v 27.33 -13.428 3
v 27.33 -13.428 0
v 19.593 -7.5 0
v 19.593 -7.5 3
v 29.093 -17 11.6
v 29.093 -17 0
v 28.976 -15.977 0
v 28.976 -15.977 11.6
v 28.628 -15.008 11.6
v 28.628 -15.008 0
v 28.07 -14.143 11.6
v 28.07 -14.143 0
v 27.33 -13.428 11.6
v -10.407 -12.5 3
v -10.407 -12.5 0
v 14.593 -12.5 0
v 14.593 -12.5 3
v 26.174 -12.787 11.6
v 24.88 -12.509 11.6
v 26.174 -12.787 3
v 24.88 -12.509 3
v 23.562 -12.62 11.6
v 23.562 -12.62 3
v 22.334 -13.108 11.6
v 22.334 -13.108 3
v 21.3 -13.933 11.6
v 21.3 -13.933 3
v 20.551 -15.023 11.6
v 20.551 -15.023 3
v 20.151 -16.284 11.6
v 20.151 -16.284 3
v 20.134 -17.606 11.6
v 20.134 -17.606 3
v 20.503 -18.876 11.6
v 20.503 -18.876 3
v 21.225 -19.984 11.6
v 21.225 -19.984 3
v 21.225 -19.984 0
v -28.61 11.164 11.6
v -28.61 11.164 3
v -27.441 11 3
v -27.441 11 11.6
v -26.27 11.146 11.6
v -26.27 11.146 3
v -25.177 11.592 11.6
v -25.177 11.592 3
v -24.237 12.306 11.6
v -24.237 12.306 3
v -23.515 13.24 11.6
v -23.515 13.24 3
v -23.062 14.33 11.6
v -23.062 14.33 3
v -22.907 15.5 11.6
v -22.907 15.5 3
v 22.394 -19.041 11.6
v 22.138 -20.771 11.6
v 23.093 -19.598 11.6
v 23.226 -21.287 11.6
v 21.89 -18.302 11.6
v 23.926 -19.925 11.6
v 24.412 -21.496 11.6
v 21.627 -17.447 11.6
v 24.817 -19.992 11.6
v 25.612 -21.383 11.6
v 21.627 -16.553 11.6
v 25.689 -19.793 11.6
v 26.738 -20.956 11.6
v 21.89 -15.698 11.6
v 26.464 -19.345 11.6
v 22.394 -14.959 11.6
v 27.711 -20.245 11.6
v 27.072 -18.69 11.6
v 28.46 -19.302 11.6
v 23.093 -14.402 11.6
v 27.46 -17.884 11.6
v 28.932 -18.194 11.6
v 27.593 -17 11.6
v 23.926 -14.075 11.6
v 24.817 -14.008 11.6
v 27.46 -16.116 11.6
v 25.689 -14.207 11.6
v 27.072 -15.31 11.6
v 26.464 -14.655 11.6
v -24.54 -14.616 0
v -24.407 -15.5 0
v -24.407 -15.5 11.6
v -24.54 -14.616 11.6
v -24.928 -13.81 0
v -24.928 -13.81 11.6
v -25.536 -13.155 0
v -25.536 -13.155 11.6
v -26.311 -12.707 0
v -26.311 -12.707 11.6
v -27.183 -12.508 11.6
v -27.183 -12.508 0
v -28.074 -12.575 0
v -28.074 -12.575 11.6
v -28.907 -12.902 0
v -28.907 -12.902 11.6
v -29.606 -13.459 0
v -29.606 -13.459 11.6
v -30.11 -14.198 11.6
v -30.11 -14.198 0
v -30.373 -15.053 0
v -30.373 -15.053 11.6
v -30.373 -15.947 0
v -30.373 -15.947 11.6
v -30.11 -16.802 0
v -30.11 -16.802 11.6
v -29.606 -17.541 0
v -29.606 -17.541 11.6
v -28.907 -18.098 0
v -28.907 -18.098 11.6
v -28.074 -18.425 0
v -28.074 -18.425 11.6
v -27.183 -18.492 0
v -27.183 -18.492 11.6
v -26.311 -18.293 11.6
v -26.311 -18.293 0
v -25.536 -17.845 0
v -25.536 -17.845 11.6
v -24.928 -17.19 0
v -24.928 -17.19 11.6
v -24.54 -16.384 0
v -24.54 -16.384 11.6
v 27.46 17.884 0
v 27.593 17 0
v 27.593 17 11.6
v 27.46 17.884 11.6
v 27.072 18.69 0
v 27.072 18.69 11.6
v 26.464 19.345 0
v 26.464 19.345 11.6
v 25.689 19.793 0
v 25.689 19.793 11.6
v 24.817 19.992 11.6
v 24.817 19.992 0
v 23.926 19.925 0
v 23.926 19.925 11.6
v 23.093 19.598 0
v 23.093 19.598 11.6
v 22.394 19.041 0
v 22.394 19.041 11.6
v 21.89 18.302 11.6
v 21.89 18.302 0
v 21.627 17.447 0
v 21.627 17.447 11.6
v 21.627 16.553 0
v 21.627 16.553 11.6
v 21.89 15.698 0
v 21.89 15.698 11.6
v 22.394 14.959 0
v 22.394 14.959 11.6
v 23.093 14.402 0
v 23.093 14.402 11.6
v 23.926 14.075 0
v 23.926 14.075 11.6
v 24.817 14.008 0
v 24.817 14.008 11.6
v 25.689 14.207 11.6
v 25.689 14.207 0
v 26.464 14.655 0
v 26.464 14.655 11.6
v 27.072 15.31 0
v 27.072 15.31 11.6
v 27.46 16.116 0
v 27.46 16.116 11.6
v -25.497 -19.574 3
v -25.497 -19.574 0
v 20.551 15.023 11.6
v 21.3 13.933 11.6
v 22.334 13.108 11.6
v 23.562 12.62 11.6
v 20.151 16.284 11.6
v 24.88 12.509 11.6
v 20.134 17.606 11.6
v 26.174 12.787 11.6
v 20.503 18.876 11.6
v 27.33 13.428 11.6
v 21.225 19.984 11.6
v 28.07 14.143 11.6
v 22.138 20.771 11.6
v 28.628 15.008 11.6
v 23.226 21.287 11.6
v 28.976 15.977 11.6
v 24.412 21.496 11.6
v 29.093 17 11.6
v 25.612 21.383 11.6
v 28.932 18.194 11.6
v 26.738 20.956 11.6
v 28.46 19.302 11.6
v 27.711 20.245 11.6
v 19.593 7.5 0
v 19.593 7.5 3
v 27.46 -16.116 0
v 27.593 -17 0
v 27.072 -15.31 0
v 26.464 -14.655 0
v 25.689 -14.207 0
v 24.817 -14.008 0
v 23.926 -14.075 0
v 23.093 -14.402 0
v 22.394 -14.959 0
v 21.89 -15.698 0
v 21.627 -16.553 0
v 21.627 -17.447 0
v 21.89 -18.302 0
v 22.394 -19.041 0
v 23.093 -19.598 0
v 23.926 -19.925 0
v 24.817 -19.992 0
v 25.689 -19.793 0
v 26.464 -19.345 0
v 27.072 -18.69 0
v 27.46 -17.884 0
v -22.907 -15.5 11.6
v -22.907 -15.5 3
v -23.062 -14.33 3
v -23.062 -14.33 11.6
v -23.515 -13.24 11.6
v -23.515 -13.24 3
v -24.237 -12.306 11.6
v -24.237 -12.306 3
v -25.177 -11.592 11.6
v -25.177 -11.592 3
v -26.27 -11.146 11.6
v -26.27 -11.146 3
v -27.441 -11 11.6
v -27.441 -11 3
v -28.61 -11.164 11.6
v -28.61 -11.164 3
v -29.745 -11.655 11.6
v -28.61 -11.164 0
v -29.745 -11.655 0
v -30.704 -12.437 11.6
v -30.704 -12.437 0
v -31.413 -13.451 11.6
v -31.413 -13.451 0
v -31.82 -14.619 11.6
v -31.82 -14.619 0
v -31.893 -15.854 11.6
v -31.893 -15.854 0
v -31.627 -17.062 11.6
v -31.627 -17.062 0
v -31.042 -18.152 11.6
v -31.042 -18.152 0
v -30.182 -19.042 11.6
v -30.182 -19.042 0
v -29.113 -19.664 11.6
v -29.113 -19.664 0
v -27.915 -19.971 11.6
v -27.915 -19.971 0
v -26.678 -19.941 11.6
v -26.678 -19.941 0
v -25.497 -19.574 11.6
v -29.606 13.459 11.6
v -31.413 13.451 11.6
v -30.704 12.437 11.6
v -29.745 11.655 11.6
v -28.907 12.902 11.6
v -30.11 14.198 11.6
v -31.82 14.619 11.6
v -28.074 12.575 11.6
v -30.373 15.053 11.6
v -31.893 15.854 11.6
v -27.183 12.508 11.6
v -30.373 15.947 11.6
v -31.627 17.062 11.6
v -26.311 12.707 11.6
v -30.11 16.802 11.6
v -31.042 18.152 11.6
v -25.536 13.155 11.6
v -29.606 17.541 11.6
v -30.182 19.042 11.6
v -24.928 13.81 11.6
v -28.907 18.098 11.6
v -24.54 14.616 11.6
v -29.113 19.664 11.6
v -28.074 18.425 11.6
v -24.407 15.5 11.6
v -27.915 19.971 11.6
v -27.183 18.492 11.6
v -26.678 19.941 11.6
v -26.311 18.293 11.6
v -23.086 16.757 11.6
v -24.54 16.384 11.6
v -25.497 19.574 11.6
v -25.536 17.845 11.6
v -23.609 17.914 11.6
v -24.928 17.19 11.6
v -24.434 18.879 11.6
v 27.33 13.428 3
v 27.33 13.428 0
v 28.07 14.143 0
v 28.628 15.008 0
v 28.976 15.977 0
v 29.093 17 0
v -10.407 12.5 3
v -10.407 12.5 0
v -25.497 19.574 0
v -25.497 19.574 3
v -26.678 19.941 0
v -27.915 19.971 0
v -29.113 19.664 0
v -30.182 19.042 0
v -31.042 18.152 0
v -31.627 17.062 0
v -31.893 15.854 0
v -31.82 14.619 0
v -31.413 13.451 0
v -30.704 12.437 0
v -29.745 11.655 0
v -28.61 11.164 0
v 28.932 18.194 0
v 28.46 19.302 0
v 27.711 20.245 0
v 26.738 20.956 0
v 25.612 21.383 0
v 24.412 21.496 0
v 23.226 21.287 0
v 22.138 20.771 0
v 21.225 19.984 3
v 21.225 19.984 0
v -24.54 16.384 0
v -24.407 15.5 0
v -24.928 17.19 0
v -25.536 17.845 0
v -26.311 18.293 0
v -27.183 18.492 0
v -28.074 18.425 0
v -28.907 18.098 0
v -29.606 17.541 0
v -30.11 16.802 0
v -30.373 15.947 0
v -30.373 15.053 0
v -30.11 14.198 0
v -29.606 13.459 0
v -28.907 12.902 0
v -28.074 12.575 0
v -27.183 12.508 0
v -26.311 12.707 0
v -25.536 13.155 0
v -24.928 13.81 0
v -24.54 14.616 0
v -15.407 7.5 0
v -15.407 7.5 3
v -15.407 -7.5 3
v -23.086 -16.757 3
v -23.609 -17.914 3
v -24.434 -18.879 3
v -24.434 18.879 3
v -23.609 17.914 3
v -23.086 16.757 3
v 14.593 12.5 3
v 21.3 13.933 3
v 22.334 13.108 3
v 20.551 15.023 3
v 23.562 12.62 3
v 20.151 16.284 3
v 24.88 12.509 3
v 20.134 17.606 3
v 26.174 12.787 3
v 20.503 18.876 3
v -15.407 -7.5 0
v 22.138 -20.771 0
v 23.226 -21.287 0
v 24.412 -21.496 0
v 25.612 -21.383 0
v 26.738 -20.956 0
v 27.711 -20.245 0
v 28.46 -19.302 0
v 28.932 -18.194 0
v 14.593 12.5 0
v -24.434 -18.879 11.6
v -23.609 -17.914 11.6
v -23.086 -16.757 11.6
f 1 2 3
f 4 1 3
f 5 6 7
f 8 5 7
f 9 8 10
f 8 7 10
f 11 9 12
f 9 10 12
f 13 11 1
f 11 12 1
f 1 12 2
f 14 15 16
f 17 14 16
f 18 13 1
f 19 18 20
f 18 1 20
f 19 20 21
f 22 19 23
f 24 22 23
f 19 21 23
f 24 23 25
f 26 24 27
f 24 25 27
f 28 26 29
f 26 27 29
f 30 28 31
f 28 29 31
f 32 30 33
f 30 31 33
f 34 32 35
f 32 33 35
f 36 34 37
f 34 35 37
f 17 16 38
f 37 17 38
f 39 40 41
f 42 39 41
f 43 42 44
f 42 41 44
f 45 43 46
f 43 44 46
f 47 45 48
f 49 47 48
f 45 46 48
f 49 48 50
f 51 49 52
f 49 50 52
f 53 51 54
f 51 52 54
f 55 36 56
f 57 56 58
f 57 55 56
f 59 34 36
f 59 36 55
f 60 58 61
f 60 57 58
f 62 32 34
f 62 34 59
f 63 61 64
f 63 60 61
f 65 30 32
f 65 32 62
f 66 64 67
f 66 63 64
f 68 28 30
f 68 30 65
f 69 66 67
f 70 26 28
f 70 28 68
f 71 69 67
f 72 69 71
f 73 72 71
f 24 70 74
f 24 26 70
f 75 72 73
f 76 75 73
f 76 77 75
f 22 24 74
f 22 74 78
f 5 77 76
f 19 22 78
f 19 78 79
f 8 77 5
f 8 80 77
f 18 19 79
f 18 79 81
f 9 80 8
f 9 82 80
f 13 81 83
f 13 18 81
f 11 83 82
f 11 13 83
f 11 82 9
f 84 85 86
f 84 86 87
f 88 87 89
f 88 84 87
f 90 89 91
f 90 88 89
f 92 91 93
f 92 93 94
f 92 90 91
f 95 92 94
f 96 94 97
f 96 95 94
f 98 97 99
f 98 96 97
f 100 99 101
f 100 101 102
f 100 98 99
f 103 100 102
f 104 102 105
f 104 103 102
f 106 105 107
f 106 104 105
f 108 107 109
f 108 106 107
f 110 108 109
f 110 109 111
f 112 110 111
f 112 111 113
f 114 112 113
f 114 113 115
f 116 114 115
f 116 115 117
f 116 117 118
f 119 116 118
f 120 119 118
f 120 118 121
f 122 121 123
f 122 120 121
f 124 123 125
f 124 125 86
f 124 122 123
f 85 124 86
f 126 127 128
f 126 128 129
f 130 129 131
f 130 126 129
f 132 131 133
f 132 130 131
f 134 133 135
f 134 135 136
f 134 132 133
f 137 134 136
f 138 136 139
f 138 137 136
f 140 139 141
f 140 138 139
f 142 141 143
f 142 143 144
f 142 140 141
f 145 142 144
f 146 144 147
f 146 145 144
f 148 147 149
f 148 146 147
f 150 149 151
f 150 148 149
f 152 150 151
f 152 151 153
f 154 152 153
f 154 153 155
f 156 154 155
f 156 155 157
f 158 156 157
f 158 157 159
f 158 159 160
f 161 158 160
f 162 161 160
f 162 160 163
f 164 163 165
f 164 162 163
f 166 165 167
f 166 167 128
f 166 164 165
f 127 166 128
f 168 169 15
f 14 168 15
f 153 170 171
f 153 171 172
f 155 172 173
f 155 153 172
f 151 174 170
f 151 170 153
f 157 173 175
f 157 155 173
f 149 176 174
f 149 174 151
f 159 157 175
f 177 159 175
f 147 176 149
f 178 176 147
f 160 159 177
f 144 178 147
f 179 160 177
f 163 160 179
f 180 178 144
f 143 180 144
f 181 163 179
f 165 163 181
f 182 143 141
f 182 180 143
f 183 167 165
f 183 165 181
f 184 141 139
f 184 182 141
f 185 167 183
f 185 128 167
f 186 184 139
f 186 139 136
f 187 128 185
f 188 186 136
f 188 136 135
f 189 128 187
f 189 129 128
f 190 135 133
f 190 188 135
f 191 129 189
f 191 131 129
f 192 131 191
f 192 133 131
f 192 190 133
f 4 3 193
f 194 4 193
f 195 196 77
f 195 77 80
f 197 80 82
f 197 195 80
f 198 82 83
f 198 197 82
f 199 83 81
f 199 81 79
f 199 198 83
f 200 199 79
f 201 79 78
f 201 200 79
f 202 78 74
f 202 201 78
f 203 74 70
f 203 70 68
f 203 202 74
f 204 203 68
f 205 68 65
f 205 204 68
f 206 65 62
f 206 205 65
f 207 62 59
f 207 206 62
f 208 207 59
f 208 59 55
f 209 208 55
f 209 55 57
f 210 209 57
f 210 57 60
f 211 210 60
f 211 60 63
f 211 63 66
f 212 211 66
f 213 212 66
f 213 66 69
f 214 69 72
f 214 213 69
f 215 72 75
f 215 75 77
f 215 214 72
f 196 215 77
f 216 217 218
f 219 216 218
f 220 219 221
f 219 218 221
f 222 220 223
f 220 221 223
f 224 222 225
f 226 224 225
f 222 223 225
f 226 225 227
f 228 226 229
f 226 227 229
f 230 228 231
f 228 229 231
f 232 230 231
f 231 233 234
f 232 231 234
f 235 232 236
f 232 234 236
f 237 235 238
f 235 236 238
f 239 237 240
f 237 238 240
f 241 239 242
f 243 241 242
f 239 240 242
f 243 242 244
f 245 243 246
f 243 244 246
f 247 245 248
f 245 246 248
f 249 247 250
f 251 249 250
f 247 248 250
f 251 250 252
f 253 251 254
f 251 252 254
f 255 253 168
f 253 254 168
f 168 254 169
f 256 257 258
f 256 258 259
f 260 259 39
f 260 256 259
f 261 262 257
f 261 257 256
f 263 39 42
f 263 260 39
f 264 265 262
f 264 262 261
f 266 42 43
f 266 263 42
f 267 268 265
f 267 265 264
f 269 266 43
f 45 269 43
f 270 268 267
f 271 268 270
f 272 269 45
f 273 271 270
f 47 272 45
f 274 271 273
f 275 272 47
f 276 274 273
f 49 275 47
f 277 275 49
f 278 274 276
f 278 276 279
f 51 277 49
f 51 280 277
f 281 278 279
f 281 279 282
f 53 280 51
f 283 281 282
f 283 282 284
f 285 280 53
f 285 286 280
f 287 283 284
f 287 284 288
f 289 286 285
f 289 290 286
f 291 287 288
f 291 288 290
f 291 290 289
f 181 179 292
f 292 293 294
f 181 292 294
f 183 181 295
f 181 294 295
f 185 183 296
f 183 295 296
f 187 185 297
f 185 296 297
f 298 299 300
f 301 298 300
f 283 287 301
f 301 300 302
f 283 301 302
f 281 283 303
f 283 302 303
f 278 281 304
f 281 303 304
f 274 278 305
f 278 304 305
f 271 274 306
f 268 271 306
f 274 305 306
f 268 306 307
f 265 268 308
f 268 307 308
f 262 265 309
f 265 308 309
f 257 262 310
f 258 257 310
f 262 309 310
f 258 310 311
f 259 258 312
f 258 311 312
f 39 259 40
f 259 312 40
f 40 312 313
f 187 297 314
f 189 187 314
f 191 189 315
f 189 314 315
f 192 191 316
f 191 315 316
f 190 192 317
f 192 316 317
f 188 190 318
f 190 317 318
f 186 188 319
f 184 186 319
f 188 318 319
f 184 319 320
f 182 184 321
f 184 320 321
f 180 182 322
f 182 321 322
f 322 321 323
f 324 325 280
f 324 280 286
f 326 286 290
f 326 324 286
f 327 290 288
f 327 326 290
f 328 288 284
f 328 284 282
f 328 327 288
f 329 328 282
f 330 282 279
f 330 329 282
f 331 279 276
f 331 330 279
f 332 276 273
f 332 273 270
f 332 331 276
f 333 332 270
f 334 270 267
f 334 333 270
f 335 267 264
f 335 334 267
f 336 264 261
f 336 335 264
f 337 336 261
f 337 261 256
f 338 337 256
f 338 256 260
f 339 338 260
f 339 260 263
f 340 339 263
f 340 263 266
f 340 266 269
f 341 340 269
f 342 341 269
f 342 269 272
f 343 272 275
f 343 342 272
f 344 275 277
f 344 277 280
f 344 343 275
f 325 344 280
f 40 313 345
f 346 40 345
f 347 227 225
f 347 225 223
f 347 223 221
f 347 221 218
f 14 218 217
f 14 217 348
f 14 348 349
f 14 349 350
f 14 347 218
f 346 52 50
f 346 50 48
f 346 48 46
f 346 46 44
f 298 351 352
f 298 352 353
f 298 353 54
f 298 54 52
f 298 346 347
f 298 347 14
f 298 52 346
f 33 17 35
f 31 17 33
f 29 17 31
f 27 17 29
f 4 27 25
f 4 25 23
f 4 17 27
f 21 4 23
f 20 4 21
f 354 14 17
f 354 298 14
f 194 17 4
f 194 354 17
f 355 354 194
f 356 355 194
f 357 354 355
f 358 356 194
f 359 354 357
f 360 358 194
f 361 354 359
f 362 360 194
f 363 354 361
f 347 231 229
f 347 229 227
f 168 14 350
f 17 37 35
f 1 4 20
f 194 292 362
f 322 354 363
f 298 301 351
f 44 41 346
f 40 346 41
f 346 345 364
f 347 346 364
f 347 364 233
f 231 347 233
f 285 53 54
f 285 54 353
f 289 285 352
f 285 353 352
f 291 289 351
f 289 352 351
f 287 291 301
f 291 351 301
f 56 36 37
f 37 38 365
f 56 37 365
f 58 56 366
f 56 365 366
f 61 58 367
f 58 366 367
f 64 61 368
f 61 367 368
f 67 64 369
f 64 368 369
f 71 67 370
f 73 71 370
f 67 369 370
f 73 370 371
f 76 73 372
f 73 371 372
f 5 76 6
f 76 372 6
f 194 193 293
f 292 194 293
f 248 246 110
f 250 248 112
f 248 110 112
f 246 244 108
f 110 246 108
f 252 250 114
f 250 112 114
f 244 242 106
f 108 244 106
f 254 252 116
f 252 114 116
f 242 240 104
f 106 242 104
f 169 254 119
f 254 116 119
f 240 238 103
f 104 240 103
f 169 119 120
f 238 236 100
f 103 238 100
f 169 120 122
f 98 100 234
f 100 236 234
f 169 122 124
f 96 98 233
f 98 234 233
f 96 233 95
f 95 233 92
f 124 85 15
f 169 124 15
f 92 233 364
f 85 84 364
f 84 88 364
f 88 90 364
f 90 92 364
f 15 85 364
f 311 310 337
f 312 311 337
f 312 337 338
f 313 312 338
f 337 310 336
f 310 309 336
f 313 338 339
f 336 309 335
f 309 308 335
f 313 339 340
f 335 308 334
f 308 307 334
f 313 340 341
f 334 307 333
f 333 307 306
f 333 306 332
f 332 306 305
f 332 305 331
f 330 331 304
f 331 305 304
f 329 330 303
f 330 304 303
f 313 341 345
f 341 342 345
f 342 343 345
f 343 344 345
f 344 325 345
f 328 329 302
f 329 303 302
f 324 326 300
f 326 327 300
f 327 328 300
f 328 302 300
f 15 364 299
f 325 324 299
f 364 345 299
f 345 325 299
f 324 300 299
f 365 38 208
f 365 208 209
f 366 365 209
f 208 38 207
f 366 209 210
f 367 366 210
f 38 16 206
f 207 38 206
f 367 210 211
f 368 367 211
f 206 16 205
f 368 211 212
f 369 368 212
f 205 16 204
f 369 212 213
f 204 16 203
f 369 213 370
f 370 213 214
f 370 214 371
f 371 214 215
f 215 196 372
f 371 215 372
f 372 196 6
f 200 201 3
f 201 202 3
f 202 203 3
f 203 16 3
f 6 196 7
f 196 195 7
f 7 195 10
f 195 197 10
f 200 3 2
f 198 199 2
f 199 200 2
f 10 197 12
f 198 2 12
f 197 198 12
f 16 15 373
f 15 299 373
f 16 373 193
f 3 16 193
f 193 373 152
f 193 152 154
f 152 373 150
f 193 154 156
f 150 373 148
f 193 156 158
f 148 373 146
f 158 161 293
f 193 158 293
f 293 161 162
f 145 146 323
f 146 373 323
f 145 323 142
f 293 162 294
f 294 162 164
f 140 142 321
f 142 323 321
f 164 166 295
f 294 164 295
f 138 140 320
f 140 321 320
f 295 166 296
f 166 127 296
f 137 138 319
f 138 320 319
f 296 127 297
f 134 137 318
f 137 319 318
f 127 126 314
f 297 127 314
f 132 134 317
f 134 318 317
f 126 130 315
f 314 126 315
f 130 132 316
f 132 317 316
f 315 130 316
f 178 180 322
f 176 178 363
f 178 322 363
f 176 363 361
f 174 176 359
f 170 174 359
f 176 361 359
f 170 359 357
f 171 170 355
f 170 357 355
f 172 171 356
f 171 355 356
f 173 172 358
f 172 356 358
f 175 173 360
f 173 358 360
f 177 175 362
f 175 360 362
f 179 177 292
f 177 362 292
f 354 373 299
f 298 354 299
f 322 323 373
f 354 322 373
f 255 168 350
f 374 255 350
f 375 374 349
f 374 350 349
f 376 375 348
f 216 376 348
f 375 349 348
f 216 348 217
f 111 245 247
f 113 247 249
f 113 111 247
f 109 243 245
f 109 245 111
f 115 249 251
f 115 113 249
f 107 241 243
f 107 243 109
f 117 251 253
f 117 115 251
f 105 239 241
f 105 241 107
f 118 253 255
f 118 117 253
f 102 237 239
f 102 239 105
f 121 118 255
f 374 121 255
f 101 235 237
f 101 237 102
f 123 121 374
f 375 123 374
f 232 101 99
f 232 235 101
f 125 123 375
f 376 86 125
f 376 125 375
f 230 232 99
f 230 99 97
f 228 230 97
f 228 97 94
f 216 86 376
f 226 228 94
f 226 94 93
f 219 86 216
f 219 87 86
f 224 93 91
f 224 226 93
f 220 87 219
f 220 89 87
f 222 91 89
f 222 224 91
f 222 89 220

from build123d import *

# Parameters (mm, degrees)
F1_DEPTH = 3
F0_R     = 3
F2_DEPTH = 11.6


with BuildPart() as f1:
    # F0 (on Top) → F1 (new body)
    with BuildSketch(Plane.XY):
        with BuildLine():
            Line((-15.406721, -12.5), (-15.406721, -7.5))
            Line((-15.406721, -7.5), (-28.609985, -11.163855))
            ThreePointArc((-28.609985, -11.163855), (-24.683184, -11.917774), (-22.906721, -15.5))
            ThreePointArc((-22.906721, -15.5), (-23.608966, -17.91393), (-25.496524, -19.57445))
            Line((-25.496524, -19.57445), (-10.406721, -12.5))
            Line((-10.406721, -12.5), (-15.406721, -12.5))
        make_face()
        Polygon((14.593279, 12.5), (-10.406721, 12.5), (-15.406721, 12.5), (-15.406721, 7.5), (-15.406721, -7.5), (-15.406721, -12.5), (-10.406721, -12.5), (14.593279, -12.5), (19.593279, -12.5), (19.593279, -7.5), (19.593279, 7.5), (19.593279, 12.5), align=None)
        with BuildLine():
            ThreePointArc((-25.496524, 19.57445), (-23.608966, 17.91393), (-22.906721, 15.5))
            ThreePointArc((-22.906721, 15.5), (-24.683184, 11.917774), (-28.609985, 11.163855))
            Line((-28.609985, 11.163855), (-15.406721, 7.5))
            Line((-15.406721, 7.5), (-15.406721, 12.5))
            Line((-15.406721, 12.5), (-10.406721, 12.5))
            Line((-10.406721, 12.5), (-25.496524, 19.57445))
        make_face()
        with BuildLine():
            Line((27.330159, -13.427958), (19.593279, -7.5))
            Line((19.593279, -7.5), (19.593279, -12.5))
            Line((19.593279, -12.5), (14.593279, -12.5))
            Line((14.593279, -12.5), (21.225295, -19.984407))
            ThreePointArc((21.225295, -19.984407), (21.299902, -13.93346), (27.330159, -13.427958))
        make_face()
        with BuildLine():
            Line((21.225295, 19.984407), (14.593279, 12.5))
            Line((14.593279, 12.5), (19.593279, 12.5))
            Line((19.593279, 12.5), (19.593279, 7.5))
            Line((19.593279, 7.5), (27.330159, 13.427958))
            ThreePointArc((27.330159, 13.427958), (21.299902, 13.93346), (21.225295, 19.984407))
        make_face()
    extrude(amount=F1_DEPTH)

    # F0 (on Top) → F2 (join)
    with BuildSketch(Plane.XY):
        with BuildLine():
            ThreePointArc((-22.906721, -15.5), (-24.683184, -11.917774), (-28.609985, -11.163855))
            ThreePointArc((-28.609985, -11.163855), (-31.626848, -17.06222), (-25.496524, -19.57445))
            ThreePointArc((-25.496524, -19.57445), (-23.608966, -17.91393), (-22.906721, -15.5))
        make_face()
        with Locations((-27.406721, -15.5)):
            Circle(F0_R, mode=Mode.SUBTRACT)
        with BuildLine():
            ThreePointArc((29.093279, -17), (28.628496, -15.008262), (27.330159, -13.427958))
            ThreePointArc((27.330159, -13.427958), (21.299902, -13.93346), (21.225295, -19.984407))
            ThreePointArc((21.225295, -19.984407), (26.189223, -21.207489), (29.093279, -17))
        make_face()
        with Locations((24.593279, -17)):
            Circle(F0_R, mode=Mode.SUBTRACT)
        with BuildLine():
            ThreePointArc((29.093279, 17), (26.189223, 21.207489), (21.225295, 19.984407))
            ThreePointArc((21.225295, 19.984407), (21.299902, 13.93346), (27.330159, 13.427958))
            ThreePointArc((27.330159, 13.427958), (28.628496, 15.008262), (29.093279, 17))
        make_face()
        with Locations((24.593279, 17)):
            Circle(F0_R, mode=Mode.SUBTRACT)
        with BuildLine():
            ThreePointArc((-28.609985, 11.163855), (-24.683184, 11.917774), (-22.906721, 15.5))
            ThreePointArc((-22.906721, 15.5), (-23.608966, 17.91393), (-25.496524, 19.57445))
            ThreePointArc((-25.496524, 19.57445), (-31.626848, 17.06222), (-28.609985, 11.163855))
        make_face()
        with Locations((-27.406721, 15.5)):
            Circle(F0_R, mode=Mode.SUBTRACT)
    extrude(amount=F2_DEPTH)


solid = f1.part
